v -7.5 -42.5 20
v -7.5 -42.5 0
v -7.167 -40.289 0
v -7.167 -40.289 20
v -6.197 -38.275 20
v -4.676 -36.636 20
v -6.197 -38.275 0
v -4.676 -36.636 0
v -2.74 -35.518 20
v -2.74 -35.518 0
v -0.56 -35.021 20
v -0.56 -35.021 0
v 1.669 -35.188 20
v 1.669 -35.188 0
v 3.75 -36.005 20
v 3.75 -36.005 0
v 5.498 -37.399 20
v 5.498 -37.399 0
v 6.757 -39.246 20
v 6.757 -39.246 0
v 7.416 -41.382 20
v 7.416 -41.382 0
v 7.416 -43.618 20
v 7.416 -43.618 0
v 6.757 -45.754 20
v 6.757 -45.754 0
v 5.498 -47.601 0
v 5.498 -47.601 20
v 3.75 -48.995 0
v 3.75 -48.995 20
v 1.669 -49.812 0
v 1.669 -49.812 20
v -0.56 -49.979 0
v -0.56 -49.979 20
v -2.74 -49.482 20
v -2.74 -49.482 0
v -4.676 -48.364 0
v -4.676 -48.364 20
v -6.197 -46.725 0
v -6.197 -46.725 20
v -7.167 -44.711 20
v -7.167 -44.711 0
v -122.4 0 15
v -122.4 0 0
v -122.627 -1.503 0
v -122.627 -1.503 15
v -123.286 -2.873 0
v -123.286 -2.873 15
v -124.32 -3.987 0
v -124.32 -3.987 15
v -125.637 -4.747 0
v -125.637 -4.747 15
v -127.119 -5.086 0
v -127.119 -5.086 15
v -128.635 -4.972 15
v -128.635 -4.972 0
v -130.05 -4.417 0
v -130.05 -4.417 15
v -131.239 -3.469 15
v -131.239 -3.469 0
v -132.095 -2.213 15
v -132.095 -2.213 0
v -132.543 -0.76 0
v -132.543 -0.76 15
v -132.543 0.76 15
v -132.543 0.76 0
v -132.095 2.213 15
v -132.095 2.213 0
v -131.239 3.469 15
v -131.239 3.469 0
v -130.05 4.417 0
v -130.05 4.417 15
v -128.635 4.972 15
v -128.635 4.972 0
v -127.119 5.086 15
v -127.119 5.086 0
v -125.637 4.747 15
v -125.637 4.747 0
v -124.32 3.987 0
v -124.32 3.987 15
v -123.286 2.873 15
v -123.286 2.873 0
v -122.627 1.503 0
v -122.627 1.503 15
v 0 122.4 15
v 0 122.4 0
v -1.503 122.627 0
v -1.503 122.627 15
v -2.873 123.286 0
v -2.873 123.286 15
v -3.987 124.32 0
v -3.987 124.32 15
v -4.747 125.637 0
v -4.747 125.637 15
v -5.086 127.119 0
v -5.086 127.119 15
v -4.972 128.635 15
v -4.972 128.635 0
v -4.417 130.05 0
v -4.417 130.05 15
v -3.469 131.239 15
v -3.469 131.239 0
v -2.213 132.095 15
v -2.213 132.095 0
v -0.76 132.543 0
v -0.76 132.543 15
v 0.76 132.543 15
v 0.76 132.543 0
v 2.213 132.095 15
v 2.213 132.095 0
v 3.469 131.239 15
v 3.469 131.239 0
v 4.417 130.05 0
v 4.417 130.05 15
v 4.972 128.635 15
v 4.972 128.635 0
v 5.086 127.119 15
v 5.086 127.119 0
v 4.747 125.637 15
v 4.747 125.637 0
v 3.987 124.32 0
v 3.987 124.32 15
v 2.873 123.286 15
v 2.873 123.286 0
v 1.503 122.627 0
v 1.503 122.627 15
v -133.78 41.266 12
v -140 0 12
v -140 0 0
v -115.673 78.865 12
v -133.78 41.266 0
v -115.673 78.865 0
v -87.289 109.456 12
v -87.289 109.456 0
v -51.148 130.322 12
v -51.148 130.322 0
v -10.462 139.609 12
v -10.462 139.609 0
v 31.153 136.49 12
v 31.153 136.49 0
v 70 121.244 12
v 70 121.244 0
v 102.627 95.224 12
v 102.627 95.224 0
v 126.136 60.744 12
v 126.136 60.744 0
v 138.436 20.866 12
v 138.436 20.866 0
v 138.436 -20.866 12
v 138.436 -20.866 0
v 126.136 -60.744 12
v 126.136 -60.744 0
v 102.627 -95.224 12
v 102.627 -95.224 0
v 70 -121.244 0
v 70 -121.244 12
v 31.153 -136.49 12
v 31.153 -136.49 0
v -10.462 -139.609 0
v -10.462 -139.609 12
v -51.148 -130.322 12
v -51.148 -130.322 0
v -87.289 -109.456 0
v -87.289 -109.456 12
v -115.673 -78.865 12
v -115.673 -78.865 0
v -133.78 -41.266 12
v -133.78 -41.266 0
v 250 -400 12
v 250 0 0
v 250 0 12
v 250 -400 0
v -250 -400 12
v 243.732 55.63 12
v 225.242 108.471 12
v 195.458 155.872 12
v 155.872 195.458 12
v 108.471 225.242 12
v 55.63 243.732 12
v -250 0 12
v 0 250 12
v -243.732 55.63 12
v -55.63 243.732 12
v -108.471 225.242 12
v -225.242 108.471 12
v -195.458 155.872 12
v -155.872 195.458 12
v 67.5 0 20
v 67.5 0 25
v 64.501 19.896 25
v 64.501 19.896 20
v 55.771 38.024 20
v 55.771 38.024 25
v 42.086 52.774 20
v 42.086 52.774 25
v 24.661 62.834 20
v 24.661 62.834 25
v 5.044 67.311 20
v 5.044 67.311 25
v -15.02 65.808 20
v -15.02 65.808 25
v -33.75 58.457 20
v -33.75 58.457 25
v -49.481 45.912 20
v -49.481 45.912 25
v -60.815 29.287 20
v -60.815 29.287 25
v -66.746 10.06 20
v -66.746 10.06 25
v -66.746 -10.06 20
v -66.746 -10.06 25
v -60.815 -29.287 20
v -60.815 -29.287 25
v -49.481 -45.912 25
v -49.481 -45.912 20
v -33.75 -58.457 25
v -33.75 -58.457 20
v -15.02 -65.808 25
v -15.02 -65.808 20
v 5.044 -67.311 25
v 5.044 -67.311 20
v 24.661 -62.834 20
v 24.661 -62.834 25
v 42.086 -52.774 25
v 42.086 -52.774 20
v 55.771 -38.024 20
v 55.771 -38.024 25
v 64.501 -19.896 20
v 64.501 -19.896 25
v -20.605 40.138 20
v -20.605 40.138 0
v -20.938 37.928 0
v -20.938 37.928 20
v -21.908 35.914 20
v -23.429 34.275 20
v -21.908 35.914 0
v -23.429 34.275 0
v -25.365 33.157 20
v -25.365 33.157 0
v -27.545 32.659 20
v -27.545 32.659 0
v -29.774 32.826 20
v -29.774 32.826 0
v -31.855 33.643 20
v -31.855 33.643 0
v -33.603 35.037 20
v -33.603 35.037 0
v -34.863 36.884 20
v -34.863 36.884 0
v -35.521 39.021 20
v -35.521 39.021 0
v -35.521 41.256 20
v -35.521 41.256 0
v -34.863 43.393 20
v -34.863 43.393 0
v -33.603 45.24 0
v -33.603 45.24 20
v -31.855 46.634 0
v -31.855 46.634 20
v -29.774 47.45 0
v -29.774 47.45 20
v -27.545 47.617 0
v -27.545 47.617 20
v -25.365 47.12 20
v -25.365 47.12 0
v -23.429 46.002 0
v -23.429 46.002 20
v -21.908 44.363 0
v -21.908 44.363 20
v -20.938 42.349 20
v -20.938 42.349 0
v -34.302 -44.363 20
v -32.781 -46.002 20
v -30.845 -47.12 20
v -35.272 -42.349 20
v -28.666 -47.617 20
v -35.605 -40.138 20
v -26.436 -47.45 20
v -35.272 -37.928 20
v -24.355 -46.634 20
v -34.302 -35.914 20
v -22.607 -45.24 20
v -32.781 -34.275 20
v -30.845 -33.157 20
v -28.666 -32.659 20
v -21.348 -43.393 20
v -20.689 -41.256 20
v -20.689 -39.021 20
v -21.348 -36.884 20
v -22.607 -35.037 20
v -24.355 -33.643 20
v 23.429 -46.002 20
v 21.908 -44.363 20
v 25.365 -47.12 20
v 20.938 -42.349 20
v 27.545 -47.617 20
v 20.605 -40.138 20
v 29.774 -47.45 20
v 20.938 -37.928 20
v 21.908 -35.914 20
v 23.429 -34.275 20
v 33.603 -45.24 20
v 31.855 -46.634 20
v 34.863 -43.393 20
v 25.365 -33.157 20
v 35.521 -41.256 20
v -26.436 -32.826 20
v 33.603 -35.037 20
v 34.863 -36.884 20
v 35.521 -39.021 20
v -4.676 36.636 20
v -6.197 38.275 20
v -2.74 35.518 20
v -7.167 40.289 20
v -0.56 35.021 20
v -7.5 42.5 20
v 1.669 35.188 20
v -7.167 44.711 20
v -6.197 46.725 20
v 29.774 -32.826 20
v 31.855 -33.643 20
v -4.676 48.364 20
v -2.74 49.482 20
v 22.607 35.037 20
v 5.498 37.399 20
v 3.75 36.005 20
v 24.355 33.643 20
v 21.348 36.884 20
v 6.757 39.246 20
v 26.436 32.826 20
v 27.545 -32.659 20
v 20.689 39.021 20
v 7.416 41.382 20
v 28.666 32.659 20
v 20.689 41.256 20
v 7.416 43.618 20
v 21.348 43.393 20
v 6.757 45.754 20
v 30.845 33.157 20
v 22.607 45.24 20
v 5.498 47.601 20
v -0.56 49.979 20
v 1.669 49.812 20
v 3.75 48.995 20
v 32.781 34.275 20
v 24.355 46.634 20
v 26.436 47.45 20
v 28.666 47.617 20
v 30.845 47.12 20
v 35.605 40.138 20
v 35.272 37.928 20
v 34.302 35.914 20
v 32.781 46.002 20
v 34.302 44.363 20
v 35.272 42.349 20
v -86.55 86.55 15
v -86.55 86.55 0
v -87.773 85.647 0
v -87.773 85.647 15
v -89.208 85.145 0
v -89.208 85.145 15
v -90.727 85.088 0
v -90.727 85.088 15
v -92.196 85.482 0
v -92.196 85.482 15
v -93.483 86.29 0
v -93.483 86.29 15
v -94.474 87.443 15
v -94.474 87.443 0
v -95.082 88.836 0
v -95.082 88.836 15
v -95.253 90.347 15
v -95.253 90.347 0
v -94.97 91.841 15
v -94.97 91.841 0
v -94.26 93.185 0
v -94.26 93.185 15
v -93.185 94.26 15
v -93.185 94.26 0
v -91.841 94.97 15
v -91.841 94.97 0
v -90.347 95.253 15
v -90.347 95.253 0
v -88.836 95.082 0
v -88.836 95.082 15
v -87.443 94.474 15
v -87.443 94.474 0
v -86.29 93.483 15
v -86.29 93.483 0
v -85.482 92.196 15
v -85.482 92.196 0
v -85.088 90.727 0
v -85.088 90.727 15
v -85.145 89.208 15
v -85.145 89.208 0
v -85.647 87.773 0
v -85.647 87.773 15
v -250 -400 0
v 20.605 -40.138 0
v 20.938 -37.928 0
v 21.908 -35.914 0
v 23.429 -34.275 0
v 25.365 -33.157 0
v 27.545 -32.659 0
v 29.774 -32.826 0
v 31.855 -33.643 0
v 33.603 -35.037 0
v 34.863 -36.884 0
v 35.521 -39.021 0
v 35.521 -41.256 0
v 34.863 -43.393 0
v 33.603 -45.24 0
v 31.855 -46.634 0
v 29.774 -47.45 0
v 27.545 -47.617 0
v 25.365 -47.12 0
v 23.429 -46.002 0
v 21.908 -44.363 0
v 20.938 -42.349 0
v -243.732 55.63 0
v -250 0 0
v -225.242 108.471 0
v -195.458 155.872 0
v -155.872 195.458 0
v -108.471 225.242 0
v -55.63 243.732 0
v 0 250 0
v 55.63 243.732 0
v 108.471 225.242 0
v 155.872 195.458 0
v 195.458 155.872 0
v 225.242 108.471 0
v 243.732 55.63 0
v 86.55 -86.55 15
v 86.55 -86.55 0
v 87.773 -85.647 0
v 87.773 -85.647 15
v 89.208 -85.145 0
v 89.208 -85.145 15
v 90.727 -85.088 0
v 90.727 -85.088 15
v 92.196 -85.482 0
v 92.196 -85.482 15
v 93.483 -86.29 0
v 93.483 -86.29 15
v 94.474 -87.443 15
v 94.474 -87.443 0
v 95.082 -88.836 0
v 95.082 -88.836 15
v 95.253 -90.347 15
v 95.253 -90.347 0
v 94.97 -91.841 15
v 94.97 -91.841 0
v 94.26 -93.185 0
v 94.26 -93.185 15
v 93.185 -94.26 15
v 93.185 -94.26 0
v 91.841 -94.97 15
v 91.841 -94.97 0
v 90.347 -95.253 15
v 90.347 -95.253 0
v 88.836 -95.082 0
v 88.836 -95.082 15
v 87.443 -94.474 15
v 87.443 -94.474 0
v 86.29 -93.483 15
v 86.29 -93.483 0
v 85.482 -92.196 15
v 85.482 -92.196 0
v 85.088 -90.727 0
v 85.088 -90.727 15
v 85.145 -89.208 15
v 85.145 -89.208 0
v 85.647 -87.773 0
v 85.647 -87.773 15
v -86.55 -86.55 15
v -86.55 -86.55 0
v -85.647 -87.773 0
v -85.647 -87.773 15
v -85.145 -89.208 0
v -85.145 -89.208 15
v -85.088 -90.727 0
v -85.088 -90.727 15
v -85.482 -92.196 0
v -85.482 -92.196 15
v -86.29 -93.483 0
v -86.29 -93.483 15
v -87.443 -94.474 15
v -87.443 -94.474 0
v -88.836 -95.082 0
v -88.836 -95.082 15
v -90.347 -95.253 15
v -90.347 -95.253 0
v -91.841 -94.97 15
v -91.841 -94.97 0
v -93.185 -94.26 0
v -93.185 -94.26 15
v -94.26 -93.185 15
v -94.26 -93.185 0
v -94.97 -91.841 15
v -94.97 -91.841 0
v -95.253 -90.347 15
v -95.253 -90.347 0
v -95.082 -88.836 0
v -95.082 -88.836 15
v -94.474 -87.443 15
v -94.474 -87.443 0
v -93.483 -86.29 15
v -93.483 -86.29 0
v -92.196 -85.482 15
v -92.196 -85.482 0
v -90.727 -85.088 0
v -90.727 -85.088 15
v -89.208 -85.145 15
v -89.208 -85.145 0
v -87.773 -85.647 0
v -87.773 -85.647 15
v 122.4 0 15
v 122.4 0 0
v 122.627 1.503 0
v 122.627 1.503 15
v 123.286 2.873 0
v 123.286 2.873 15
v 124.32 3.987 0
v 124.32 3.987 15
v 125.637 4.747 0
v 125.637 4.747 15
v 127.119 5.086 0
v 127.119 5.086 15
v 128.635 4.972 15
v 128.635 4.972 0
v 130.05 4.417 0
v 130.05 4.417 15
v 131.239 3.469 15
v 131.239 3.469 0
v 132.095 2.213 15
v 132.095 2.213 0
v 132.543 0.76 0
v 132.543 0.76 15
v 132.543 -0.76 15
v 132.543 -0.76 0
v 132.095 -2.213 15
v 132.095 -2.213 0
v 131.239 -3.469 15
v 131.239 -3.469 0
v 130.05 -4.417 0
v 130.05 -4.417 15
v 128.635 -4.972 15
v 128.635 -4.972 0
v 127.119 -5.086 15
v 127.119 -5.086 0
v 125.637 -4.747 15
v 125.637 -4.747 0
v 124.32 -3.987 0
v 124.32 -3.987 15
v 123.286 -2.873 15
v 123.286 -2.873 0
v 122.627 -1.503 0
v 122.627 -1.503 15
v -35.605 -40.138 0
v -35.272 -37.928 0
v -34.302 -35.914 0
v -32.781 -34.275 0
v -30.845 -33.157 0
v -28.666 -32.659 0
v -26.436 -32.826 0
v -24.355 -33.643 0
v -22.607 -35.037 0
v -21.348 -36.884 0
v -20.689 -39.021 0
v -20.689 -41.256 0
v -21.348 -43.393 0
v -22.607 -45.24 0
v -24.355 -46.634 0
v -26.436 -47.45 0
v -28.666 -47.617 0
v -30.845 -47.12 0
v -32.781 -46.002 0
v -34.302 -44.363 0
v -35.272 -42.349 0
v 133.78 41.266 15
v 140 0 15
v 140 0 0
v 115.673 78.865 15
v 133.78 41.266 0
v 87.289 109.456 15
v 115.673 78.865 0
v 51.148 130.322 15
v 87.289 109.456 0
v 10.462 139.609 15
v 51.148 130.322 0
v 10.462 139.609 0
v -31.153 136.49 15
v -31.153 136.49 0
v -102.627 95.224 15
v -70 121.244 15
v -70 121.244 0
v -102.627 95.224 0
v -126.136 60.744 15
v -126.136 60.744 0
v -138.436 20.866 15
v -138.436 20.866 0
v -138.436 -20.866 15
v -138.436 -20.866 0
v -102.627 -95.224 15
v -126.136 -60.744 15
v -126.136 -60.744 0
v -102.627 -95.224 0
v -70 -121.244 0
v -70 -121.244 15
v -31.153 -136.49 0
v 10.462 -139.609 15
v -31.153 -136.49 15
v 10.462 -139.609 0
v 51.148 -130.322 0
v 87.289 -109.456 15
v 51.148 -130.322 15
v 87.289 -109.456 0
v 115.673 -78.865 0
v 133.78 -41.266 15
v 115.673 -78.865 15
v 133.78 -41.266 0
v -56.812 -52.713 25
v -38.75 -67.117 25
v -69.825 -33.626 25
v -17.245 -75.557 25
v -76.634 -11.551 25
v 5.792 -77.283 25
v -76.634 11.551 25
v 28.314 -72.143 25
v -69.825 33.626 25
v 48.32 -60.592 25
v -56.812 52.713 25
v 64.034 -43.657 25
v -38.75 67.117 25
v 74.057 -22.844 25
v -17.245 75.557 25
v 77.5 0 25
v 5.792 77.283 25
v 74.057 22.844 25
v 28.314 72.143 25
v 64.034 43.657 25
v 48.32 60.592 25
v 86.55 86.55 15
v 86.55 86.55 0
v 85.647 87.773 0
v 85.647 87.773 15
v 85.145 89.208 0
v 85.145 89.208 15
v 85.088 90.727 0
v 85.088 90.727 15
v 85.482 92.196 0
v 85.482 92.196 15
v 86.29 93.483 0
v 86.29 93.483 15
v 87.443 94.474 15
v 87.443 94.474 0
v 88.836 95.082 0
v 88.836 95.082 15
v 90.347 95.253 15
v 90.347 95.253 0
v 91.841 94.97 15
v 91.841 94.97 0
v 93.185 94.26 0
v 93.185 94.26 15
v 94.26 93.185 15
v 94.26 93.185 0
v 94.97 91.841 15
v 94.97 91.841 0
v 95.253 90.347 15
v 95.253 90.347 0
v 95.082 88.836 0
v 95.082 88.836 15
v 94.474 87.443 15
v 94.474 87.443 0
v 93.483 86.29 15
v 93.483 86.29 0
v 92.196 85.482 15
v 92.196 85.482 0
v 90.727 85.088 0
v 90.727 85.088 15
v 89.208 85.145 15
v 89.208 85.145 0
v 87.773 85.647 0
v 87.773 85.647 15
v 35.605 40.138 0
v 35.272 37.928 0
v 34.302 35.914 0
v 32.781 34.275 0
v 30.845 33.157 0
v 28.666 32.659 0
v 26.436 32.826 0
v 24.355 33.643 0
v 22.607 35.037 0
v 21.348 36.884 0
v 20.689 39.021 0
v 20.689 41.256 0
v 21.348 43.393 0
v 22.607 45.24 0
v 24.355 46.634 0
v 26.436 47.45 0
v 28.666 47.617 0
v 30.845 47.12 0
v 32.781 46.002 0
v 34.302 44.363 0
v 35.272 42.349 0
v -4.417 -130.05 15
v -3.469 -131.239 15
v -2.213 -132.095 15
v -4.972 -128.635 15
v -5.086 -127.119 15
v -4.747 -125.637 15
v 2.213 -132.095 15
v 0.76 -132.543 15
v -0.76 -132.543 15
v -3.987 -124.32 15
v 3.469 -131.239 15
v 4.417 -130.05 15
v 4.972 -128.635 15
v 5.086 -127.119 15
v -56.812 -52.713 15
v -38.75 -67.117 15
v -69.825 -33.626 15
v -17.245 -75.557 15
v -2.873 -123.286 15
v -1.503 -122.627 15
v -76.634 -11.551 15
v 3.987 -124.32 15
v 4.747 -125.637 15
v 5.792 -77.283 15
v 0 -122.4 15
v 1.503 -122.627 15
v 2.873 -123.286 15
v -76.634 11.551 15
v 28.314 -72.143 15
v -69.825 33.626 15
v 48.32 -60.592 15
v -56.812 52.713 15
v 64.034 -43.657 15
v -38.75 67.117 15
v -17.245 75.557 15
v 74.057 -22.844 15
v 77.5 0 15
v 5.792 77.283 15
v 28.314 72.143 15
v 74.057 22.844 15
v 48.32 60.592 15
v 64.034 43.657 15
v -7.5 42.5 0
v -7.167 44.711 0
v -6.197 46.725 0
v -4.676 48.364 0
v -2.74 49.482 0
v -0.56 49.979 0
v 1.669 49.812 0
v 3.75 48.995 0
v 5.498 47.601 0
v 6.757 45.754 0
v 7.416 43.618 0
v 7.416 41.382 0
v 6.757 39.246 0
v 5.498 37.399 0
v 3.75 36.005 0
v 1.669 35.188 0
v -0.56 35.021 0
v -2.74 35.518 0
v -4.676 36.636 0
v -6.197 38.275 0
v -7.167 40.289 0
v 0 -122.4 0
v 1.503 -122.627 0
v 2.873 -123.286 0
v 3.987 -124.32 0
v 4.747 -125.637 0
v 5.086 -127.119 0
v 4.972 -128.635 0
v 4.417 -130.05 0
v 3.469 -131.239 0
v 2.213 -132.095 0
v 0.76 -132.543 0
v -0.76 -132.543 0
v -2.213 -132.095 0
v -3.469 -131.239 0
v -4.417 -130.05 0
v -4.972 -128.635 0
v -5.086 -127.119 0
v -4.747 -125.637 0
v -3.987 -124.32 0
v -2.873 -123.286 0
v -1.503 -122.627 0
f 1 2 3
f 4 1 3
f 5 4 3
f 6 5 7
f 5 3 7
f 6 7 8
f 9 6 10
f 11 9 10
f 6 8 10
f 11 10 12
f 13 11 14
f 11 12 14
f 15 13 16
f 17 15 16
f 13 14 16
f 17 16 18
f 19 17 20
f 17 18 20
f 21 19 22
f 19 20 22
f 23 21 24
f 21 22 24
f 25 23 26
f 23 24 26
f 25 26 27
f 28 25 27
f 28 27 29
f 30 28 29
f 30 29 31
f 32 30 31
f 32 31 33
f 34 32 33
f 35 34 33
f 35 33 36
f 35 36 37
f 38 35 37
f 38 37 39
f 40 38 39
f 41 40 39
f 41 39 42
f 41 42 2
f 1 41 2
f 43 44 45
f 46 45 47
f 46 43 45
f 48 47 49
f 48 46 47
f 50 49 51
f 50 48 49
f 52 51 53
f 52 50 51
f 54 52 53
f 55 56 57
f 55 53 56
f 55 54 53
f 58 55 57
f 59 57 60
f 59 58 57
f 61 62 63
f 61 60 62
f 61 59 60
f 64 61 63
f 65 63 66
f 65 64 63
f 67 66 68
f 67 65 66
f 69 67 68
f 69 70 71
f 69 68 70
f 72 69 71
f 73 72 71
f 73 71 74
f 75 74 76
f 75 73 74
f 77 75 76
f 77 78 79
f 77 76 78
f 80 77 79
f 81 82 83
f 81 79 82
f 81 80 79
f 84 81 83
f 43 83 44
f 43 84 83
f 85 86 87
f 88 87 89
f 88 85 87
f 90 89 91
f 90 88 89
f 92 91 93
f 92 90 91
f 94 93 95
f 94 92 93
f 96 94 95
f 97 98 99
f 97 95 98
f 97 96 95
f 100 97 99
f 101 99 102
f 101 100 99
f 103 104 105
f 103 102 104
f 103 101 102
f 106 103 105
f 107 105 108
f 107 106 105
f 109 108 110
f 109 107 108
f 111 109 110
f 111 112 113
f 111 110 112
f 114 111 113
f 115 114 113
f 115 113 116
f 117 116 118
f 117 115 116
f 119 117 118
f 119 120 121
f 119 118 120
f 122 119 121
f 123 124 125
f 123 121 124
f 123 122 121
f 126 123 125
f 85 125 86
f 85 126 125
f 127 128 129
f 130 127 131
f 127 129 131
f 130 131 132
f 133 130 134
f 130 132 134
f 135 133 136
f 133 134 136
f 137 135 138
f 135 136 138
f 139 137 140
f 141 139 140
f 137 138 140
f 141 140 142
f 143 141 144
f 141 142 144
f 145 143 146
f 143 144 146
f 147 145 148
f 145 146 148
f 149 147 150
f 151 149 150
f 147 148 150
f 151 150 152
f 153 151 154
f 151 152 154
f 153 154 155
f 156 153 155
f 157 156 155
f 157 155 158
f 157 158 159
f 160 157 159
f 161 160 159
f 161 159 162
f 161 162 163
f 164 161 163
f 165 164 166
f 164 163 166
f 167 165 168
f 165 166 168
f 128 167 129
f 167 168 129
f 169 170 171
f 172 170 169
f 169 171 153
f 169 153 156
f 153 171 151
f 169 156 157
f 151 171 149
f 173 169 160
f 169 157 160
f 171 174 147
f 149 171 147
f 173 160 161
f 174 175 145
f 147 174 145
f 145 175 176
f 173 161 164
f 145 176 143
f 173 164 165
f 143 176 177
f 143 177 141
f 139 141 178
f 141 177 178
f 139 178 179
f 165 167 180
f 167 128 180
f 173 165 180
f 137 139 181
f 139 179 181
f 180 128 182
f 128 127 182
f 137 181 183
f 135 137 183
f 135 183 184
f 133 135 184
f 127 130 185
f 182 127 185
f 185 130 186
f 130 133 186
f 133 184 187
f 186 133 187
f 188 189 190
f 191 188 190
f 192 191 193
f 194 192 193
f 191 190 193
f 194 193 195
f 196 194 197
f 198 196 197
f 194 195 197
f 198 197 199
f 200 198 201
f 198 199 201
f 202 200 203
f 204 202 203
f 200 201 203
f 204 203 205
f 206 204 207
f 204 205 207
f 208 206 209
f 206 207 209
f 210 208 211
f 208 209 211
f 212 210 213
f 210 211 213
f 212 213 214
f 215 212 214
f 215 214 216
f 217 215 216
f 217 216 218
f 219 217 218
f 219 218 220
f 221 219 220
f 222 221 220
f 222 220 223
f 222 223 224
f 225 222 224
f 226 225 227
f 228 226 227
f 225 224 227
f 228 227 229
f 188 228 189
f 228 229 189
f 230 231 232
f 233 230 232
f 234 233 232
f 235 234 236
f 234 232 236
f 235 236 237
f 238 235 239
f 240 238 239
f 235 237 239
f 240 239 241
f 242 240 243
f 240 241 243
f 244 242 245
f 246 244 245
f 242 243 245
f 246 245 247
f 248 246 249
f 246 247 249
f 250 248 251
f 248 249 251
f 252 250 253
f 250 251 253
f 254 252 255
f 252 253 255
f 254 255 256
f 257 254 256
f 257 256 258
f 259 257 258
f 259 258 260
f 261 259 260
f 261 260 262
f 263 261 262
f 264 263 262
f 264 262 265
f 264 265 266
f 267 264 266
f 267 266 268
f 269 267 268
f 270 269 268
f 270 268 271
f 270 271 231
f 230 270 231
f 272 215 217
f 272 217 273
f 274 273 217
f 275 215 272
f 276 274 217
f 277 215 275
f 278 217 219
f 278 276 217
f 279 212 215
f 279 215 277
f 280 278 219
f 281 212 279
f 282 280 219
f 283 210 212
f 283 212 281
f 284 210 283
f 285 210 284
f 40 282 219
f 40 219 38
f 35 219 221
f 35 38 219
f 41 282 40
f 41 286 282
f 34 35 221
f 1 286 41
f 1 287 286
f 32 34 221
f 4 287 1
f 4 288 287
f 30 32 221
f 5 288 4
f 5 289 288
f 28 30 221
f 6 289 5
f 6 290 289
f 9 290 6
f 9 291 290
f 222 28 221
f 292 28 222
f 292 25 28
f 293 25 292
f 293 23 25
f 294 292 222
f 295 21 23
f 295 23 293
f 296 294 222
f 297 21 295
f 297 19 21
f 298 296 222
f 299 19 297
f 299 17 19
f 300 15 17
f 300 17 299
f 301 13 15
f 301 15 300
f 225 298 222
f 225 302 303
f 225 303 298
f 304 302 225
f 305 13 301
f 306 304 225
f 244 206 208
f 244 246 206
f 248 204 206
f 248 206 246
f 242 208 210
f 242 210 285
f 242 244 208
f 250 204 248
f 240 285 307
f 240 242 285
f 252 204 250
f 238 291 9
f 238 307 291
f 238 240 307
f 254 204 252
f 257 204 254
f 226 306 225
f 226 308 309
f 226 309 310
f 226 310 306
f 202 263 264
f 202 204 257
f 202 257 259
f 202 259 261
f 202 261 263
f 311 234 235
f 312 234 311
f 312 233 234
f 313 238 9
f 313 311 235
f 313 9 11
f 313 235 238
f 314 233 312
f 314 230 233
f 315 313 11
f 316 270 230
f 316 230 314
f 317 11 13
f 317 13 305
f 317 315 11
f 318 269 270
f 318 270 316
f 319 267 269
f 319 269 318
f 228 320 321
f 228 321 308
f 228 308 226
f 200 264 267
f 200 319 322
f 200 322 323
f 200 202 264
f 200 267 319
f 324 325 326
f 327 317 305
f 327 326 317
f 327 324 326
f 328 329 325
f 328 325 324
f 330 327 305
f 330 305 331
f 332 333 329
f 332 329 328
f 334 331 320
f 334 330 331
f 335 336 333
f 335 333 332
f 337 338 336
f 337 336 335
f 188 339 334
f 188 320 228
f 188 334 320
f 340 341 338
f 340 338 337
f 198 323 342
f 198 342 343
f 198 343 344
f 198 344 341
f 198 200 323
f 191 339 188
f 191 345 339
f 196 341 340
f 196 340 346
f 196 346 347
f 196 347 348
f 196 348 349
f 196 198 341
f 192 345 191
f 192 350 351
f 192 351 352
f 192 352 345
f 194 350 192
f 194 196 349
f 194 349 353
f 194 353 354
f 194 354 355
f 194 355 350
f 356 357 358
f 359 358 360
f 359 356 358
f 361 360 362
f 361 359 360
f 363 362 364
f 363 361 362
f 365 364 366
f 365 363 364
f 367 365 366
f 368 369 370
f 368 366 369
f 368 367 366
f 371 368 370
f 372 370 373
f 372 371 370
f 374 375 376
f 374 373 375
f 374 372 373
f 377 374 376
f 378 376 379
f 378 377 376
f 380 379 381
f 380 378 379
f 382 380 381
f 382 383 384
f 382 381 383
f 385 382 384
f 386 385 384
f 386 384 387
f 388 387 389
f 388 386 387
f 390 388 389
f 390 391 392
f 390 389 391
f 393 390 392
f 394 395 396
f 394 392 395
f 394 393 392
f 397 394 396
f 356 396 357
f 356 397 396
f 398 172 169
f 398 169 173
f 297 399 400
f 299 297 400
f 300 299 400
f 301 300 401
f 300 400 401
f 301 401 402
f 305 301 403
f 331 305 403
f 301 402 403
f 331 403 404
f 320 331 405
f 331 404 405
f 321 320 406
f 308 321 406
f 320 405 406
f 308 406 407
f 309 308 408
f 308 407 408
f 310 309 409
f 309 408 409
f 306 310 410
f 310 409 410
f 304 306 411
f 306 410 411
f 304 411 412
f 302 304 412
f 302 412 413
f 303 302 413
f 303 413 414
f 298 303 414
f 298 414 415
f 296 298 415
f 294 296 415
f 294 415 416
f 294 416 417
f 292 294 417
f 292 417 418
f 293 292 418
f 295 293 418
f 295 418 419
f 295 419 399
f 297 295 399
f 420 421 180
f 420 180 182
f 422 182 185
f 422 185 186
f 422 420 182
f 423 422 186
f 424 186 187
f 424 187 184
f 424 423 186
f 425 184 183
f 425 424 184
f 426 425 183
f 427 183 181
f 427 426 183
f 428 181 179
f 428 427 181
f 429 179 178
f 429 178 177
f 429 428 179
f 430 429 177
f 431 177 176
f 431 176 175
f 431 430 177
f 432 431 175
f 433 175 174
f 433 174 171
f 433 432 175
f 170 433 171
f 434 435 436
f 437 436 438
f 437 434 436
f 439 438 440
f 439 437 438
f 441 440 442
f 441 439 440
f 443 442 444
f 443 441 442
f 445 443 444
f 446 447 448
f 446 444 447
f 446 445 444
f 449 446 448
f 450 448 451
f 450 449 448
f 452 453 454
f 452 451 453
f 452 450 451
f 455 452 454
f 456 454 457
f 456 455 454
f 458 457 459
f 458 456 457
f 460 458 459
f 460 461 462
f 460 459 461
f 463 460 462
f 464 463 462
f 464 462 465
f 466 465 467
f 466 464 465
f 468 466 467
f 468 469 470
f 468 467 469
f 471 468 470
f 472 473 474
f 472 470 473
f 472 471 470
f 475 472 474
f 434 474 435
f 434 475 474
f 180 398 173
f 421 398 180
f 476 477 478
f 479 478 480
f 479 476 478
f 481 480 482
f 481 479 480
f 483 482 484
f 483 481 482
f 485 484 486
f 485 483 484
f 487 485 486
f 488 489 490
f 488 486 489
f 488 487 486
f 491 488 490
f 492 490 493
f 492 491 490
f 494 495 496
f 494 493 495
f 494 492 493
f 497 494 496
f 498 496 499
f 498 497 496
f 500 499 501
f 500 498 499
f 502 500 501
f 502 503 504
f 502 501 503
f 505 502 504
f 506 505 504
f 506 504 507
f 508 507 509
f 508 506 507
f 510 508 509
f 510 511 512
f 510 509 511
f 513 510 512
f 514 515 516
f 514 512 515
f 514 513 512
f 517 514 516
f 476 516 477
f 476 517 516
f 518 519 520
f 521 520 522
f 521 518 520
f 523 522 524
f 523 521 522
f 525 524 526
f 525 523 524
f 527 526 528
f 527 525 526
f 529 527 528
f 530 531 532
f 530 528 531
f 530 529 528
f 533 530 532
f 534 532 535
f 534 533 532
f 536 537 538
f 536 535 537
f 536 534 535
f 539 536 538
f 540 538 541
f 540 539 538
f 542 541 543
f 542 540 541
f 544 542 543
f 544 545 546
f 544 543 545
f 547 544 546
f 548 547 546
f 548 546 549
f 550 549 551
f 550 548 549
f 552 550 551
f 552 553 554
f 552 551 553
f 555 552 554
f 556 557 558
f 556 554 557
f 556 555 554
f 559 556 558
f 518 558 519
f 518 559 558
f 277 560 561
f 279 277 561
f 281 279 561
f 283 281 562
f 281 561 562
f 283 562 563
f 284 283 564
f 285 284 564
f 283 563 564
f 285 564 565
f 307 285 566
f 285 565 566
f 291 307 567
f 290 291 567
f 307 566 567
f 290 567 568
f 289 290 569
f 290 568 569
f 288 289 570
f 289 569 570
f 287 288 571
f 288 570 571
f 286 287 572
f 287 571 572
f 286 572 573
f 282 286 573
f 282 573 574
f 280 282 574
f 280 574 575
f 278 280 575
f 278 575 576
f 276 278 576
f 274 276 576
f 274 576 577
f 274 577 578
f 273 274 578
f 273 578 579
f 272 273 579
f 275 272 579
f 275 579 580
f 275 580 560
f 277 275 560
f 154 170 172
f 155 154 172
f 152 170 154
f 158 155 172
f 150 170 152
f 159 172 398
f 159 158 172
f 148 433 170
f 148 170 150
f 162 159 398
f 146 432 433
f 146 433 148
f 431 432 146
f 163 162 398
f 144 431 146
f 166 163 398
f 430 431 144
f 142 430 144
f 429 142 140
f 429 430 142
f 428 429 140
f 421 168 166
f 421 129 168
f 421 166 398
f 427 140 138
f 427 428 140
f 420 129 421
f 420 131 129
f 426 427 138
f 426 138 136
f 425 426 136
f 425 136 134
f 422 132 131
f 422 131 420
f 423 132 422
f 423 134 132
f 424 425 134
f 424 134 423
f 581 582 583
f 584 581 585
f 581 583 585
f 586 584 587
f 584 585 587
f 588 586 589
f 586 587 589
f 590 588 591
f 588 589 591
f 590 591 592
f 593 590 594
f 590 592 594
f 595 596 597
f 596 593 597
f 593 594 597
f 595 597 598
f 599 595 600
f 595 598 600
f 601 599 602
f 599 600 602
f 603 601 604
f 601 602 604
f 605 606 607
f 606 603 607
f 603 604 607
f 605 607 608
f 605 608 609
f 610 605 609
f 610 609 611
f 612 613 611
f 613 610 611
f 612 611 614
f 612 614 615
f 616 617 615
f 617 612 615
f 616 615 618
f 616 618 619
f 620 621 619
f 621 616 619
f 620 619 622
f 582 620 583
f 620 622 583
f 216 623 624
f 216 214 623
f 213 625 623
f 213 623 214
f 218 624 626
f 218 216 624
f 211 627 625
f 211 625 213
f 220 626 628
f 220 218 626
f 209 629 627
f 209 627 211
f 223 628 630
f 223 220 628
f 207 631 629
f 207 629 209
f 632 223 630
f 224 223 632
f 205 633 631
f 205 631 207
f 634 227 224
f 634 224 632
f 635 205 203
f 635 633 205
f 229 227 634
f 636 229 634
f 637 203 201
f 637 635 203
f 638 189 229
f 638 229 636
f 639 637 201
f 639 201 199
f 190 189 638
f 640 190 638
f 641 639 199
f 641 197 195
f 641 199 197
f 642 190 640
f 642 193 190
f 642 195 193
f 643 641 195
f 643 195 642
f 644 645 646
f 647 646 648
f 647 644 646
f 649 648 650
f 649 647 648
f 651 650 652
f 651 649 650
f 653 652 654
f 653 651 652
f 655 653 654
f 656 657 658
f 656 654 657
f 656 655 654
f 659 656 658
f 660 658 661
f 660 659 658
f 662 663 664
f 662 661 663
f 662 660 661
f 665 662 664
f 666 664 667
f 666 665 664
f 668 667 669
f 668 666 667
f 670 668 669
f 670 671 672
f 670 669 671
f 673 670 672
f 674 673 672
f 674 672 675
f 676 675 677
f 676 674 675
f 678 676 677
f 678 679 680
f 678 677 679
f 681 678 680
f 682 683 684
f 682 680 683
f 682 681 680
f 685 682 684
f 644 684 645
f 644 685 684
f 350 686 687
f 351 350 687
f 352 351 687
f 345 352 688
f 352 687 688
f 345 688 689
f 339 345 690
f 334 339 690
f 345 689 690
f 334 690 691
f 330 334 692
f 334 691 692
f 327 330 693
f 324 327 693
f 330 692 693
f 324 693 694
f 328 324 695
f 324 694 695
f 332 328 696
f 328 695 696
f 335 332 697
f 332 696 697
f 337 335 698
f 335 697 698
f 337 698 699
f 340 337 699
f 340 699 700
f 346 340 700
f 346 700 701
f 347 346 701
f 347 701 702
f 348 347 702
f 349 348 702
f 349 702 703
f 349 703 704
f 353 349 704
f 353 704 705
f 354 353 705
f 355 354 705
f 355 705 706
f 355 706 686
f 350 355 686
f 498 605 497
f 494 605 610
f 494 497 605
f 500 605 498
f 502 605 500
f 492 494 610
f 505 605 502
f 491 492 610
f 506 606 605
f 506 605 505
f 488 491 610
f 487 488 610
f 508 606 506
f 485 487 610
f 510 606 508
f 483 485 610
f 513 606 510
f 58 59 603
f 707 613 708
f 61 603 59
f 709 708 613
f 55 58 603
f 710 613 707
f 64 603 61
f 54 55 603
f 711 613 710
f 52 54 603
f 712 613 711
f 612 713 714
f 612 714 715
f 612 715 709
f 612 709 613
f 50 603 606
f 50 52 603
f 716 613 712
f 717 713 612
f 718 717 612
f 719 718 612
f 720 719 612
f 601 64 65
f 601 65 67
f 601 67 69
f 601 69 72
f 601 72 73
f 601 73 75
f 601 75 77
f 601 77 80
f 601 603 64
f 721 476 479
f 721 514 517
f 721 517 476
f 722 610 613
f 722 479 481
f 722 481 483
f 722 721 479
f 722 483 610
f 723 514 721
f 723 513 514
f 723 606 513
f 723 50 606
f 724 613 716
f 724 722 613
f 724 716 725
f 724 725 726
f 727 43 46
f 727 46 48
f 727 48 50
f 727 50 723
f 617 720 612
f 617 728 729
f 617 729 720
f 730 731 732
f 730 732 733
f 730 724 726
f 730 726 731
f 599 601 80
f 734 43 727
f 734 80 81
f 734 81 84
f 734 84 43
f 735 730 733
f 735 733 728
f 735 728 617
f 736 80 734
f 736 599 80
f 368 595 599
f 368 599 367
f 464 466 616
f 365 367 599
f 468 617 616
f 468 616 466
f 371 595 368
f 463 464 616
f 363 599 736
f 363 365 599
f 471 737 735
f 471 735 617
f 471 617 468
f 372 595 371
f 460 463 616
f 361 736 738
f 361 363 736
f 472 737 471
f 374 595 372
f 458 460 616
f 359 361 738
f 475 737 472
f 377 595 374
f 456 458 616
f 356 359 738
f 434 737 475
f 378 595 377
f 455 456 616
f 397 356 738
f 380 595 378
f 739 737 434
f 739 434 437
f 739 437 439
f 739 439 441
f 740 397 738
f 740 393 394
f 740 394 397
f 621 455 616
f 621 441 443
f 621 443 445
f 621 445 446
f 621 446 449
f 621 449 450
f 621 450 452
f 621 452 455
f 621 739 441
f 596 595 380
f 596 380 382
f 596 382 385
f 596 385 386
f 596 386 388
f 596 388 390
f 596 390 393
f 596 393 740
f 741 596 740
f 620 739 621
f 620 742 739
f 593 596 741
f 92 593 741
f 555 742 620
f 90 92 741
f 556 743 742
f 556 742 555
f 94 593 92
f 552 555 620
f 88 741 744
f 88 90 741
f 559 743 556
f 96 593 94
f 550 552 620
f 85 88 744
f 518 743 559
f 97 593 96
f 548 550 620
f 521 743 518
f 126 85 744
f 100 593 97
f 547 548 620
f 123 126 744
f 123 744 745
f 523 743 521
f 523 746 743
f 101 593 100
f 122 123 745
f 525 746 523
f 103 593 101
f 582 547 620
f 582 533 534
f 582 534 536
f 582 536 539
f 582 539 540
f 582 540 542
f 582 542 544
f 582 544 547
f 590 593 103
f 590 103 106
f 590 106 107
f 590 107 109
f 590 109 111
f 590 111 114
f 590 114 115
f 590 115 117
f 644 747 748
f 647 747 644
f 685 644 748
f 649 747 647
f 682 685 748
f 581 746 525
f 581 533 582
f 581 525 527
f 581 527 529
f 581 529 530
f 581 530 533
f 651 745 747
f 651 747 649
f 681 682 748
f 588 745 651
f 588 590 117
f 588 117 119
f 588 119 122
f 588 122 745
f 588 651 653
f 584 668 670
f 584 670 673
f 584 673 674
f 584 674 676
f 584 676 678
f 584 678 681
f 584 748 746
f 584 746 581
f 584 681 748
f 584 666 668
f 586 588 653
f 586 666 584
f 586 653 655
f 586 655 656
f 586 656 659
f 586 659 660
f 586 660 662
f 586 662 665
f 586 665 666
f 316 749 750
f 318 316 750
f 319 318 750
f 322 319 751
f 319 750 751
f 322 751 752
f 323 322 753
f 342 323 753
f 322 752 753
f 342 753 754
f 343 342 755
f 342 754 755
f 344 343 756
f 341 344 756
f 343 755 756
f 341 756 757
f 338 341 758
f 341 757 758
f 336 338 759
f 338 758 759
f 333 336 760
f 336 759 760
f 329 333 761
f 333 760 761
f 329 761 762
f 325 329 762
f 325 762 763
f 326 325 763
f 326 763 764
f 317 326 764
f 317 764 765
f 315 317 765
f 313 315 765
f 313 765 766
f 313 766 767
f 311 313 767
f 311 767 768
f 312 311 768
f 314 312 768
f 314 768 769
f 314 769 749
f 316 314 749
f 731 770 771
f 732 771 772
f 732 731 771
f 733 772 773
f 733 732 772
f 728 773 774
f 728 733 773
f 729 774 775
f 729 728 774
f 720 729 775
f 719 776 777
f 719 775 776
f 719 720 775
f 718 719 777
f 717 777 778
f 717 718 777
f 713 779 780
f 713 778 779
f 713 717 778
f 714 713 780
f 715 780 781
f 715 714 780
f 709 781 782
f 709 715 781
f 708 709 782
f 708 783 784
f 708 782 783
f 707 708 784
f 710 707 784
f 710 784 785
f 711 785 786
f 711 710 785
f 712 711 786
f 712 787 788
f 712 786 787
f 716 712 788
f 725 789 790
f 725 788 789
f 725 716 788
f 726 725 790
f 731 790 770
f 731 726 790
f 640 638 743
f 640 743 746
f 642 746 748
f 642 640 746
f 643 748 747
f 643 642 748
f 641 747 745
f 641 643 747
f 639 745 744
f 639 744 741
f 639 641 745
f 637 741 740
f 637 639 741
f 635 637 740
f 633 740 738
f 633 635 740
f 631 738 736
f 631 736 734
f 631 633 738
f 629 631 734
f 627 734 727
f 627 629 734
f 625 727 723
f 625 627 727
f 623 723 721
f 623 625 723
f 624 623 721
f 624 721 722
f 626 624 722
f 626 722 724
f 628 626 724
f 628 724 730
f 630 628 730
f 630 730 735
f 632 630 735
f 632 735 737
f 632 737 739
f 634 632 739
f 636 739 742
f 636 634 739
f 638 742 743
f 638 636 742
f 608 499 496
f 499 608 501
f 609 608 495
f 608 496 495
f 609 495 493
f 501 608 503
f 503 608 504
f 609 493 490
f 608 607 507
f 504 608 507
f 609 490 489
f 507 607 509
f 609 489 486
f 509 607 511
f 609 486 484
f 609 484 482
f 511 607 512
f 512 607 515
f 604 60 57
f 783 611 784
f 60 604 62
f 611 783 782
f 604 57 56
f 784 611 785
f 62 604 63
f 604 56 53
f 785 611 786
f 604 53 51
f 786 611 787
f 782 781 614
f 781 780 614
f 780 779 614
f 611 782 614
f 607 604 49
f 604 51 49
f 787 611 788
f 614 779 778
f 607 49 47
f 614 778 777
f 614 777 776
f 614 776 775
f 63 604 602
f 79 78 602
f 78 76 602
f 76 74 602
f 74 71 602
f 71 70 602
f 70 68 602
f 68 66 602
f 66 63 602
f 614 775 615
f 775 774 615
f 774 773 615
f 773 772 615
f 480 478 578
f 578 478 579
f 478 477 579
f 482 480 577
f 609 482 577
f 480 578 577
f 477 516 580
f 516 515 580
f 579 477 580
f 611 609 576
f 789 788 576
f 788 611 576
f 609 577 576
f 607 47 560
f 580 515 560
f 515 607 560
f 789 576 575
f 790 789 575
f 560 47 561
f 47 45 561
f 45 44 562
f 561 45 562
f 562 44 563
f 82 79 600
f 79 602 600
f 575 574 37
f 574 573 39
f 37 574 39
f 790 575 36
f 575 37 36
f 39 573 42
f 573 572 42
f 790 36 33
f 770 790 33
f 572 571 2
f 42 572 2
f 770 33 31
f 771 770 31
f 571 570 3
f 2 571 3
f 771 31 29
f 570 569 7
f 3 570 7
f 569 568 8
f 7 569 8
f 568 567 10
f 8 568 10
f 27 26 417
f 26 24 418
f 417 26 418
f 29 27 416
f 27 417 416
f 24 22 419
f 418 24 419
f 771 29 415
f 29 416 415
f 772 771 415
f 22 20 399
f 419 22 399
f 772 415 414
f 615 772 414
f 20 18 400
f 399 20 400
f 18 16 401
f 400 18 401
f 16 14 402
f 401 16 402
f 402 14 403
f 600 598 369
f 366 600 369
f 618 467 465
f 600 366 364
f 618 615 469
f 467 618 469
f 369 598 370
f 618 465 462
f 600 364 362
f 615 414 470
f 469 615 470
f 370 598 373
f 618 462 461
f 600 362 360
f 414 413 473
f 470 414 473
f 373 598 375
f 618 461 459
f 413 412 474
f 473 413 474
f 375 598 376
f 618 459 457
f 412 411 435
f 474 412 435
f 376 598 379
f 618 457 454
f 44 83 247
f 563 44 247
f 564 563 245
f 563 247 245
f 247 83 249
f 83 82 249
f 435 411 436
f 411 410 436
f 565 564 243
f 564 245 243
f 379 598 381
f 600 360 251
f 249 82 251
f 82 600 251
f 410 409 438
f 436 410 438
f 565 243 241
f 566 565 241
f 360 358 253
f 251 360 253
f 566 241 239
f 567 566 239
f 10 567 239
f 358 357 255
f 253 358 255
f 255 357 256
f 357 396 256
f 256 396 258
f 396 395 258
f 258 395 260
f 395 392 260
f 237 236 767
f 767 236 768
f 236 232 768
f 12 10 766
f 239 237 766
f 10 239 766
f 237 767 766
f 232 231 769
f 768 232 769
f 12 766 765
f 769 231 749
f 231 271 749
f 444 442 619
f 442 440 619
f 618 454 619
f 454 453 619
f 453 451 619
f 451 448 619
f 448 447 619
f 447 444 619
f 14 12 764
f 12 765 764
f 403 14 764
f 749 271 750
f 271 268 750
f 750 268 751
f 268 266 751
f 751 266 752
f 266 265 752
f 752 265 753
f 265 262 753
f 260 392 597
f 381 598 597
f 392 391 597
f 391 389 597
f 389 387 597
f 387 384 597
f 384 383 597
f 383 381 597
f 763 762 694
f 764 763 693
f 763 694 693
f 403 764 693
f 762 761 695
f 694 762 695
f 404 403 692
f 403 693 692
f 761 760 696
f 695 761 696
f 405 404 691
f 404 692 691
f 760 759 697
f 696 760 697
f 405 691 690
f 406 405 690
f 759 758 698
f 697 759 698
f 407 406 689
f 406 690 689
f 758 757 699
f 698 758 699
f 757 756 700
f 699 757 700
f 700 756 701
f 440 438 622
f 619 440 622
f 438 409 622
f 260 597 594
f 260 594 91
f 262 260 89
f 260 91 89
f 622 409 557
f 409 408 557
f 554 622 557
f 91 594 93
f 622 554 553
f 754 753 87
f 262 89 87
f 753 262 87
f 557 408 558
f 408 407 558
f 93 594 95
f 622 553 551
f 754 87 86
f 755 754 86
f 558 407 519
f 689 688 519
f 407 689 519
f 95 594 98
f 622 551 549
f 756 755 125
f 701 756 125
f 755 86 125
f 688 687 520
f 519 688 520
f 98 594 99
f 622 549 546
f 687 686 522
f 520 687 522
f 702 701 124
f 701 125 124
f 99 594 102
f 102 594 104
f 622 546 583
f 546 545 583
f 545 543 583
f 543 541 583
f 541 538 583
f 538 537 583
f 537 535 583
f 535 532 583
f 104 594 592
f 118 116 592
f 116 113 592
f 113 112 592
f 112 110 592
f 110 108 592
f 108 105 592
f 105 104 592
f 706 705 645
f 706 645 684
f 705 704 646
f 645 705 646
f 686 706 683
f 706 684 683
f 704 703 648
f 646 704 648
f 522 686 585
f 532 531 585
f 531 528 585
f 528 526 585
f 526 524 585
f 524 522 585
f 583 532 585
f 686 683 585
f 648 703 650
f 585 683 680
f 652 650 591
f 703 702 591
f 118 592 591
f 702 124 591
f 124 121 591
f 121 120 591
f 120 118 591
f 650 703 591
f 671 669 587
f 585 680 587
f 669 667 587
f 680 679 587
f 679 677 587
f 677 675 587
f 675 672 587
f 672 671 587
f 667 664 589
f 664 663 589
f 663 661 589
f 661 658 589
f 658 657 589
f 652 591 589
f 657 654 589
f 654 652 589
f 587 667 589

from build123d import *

# Parameters (mm, degrees)
SKETCH_1_R               = 140
EXTRUDE_1_DEPTH          = 25
SKETCH_2_R               = 67.5
CUT_EXTRUDE_1_DEPTH      = 5
SKETCH_5_OUTSIDE_W       = 361.354
SKETCH_5_OUTSIDE_H       = 361.354
SKETCH_5_OUTSIDE_R       = 77.5
CUT_EXTRUDE_4_DEPTH      = 10
SKETCH_6_R               = 7.5
CUT_EXTRUDE_5_DEPTH      = 200.562020435
PATTERN_CIRCULAR_1_COUNT = 8
SKETCH_10_R              = 140
EXTRUDE_2_DEPTH          = 12


with BuildPart() as part:
    # 草图1 → 凸台-拉伸1 (new body)
    with BuildSketch(Plane.XY):
        Circle(SKETCH_1_R)
    extrude(amount=EXTRUDE_1_DEPTH)

    # 草图2 → 切除-拉伸1 (cut)
    with BuildSketch(Plane.XY.offset(25)):
        Circle(SKETCH_2_R)
    extrude(amount=-CUT_EXTRUDE_1_DEPTH, mode=Mode.SUBTRACT)

    # 草图5 outside → 切除-拉伸4 (cut)
    with BuildSketch(Plane.XY.offset(25)):
        Rectangle(SKETCH_5_OUTSIDE_W, SKETCH_5_OUTSIDE_H)
        Circle(SKETCH_5_OUTSIDE_R, mode=Mode.SUBTRACT)
    extrude(amount=-CUT_EXTRUDE_4_DEPTH, mode=Mode.SUBTRACT)

    # 草图6 → 切除-拉伸5 (cut, through all)
    with BuildSketch(Plane(origin=(0, 0, 0), x_dir=(-1, 0, 0), z_dir=(0, 0, -1))):
        with Locations((0, 42.5)):
            Circle(SKETCH_6_R)
        with Locations((0, -42.5)):
            Circle(SKETCH_6_R)
        with Locations((-28.105245381, -40.13845017)):
            Circle(SKETCH_6_R)
        with Locations((28.105245381, -40.13845017)):
            Circle(SKETCH_6_R)
        with Locations(Location((28.105245381, 40.13845017, 0), (0, 0, 180))):
            Circle(SKETCH_6_R)
        with Locations(Location((-28.105245381, 40.13845017, 0), (0, 0, 180))):
            Circle(SKETCH_6_R)
    extrude(amount=-CUT_EXTRUDE_5_DEPTH, mode=Mode.SUBTRACT)

    # 草图8 → M12 螺纹孔1 (revolve, cut)
    with BuildSketch(Plane(origin=(0, 127.5, 15), x_dir=(0, -1, 0), z_dir=(1, 0, 0))):
        Polygon((0, 0), (0, 32.314389157), (5.1, 29.25), (5.1, 0), align=None)
    hole_wizard_m12_1 = revolve(axis=Axis((0, 127.5, 21.35), (0, 0, -1)), mode=Mode.SUBTRACT)

    # 阵列(圆周)1: M12 螺纹孔1 ×8 about axis
    pattern_circular_1_axis = Axis((0, 0, 0), (0, 0, 1))
    for i in range(1, PATTERN_CIRCULAR_1_COUNT):
        add(hole_wizard_m12_1.rotate(pattern_circular_1_axis, i * 360 / PATTERN_CIRCULAR_1_COUNT), mode=Mode.SUBTRACT)


with BuildPart() as body_2:
    # 草图10 → 凸台-拉伸2 (new body)
    with BuildSketch(Plane(origin=(0, 0, 0), x_dir=(-1, 0, 0), z_dir=(0, 0, -1))):
        with BuildLine():
            Line((-250, 0), (-250, -400))
            Line((-250, -400), (250, -400))
            Line((250, -400), (250, 0))
            ThreePointArc((250, 0), (0, 250), (-250, 0))
        make_face()
        Circle(SKETCH_10_R, mode=Mode.SUBTRACT)
    extrude(amount=-EXTRUDE_2_DEPTH)


solid = Compound([part.part, body_2.part])
